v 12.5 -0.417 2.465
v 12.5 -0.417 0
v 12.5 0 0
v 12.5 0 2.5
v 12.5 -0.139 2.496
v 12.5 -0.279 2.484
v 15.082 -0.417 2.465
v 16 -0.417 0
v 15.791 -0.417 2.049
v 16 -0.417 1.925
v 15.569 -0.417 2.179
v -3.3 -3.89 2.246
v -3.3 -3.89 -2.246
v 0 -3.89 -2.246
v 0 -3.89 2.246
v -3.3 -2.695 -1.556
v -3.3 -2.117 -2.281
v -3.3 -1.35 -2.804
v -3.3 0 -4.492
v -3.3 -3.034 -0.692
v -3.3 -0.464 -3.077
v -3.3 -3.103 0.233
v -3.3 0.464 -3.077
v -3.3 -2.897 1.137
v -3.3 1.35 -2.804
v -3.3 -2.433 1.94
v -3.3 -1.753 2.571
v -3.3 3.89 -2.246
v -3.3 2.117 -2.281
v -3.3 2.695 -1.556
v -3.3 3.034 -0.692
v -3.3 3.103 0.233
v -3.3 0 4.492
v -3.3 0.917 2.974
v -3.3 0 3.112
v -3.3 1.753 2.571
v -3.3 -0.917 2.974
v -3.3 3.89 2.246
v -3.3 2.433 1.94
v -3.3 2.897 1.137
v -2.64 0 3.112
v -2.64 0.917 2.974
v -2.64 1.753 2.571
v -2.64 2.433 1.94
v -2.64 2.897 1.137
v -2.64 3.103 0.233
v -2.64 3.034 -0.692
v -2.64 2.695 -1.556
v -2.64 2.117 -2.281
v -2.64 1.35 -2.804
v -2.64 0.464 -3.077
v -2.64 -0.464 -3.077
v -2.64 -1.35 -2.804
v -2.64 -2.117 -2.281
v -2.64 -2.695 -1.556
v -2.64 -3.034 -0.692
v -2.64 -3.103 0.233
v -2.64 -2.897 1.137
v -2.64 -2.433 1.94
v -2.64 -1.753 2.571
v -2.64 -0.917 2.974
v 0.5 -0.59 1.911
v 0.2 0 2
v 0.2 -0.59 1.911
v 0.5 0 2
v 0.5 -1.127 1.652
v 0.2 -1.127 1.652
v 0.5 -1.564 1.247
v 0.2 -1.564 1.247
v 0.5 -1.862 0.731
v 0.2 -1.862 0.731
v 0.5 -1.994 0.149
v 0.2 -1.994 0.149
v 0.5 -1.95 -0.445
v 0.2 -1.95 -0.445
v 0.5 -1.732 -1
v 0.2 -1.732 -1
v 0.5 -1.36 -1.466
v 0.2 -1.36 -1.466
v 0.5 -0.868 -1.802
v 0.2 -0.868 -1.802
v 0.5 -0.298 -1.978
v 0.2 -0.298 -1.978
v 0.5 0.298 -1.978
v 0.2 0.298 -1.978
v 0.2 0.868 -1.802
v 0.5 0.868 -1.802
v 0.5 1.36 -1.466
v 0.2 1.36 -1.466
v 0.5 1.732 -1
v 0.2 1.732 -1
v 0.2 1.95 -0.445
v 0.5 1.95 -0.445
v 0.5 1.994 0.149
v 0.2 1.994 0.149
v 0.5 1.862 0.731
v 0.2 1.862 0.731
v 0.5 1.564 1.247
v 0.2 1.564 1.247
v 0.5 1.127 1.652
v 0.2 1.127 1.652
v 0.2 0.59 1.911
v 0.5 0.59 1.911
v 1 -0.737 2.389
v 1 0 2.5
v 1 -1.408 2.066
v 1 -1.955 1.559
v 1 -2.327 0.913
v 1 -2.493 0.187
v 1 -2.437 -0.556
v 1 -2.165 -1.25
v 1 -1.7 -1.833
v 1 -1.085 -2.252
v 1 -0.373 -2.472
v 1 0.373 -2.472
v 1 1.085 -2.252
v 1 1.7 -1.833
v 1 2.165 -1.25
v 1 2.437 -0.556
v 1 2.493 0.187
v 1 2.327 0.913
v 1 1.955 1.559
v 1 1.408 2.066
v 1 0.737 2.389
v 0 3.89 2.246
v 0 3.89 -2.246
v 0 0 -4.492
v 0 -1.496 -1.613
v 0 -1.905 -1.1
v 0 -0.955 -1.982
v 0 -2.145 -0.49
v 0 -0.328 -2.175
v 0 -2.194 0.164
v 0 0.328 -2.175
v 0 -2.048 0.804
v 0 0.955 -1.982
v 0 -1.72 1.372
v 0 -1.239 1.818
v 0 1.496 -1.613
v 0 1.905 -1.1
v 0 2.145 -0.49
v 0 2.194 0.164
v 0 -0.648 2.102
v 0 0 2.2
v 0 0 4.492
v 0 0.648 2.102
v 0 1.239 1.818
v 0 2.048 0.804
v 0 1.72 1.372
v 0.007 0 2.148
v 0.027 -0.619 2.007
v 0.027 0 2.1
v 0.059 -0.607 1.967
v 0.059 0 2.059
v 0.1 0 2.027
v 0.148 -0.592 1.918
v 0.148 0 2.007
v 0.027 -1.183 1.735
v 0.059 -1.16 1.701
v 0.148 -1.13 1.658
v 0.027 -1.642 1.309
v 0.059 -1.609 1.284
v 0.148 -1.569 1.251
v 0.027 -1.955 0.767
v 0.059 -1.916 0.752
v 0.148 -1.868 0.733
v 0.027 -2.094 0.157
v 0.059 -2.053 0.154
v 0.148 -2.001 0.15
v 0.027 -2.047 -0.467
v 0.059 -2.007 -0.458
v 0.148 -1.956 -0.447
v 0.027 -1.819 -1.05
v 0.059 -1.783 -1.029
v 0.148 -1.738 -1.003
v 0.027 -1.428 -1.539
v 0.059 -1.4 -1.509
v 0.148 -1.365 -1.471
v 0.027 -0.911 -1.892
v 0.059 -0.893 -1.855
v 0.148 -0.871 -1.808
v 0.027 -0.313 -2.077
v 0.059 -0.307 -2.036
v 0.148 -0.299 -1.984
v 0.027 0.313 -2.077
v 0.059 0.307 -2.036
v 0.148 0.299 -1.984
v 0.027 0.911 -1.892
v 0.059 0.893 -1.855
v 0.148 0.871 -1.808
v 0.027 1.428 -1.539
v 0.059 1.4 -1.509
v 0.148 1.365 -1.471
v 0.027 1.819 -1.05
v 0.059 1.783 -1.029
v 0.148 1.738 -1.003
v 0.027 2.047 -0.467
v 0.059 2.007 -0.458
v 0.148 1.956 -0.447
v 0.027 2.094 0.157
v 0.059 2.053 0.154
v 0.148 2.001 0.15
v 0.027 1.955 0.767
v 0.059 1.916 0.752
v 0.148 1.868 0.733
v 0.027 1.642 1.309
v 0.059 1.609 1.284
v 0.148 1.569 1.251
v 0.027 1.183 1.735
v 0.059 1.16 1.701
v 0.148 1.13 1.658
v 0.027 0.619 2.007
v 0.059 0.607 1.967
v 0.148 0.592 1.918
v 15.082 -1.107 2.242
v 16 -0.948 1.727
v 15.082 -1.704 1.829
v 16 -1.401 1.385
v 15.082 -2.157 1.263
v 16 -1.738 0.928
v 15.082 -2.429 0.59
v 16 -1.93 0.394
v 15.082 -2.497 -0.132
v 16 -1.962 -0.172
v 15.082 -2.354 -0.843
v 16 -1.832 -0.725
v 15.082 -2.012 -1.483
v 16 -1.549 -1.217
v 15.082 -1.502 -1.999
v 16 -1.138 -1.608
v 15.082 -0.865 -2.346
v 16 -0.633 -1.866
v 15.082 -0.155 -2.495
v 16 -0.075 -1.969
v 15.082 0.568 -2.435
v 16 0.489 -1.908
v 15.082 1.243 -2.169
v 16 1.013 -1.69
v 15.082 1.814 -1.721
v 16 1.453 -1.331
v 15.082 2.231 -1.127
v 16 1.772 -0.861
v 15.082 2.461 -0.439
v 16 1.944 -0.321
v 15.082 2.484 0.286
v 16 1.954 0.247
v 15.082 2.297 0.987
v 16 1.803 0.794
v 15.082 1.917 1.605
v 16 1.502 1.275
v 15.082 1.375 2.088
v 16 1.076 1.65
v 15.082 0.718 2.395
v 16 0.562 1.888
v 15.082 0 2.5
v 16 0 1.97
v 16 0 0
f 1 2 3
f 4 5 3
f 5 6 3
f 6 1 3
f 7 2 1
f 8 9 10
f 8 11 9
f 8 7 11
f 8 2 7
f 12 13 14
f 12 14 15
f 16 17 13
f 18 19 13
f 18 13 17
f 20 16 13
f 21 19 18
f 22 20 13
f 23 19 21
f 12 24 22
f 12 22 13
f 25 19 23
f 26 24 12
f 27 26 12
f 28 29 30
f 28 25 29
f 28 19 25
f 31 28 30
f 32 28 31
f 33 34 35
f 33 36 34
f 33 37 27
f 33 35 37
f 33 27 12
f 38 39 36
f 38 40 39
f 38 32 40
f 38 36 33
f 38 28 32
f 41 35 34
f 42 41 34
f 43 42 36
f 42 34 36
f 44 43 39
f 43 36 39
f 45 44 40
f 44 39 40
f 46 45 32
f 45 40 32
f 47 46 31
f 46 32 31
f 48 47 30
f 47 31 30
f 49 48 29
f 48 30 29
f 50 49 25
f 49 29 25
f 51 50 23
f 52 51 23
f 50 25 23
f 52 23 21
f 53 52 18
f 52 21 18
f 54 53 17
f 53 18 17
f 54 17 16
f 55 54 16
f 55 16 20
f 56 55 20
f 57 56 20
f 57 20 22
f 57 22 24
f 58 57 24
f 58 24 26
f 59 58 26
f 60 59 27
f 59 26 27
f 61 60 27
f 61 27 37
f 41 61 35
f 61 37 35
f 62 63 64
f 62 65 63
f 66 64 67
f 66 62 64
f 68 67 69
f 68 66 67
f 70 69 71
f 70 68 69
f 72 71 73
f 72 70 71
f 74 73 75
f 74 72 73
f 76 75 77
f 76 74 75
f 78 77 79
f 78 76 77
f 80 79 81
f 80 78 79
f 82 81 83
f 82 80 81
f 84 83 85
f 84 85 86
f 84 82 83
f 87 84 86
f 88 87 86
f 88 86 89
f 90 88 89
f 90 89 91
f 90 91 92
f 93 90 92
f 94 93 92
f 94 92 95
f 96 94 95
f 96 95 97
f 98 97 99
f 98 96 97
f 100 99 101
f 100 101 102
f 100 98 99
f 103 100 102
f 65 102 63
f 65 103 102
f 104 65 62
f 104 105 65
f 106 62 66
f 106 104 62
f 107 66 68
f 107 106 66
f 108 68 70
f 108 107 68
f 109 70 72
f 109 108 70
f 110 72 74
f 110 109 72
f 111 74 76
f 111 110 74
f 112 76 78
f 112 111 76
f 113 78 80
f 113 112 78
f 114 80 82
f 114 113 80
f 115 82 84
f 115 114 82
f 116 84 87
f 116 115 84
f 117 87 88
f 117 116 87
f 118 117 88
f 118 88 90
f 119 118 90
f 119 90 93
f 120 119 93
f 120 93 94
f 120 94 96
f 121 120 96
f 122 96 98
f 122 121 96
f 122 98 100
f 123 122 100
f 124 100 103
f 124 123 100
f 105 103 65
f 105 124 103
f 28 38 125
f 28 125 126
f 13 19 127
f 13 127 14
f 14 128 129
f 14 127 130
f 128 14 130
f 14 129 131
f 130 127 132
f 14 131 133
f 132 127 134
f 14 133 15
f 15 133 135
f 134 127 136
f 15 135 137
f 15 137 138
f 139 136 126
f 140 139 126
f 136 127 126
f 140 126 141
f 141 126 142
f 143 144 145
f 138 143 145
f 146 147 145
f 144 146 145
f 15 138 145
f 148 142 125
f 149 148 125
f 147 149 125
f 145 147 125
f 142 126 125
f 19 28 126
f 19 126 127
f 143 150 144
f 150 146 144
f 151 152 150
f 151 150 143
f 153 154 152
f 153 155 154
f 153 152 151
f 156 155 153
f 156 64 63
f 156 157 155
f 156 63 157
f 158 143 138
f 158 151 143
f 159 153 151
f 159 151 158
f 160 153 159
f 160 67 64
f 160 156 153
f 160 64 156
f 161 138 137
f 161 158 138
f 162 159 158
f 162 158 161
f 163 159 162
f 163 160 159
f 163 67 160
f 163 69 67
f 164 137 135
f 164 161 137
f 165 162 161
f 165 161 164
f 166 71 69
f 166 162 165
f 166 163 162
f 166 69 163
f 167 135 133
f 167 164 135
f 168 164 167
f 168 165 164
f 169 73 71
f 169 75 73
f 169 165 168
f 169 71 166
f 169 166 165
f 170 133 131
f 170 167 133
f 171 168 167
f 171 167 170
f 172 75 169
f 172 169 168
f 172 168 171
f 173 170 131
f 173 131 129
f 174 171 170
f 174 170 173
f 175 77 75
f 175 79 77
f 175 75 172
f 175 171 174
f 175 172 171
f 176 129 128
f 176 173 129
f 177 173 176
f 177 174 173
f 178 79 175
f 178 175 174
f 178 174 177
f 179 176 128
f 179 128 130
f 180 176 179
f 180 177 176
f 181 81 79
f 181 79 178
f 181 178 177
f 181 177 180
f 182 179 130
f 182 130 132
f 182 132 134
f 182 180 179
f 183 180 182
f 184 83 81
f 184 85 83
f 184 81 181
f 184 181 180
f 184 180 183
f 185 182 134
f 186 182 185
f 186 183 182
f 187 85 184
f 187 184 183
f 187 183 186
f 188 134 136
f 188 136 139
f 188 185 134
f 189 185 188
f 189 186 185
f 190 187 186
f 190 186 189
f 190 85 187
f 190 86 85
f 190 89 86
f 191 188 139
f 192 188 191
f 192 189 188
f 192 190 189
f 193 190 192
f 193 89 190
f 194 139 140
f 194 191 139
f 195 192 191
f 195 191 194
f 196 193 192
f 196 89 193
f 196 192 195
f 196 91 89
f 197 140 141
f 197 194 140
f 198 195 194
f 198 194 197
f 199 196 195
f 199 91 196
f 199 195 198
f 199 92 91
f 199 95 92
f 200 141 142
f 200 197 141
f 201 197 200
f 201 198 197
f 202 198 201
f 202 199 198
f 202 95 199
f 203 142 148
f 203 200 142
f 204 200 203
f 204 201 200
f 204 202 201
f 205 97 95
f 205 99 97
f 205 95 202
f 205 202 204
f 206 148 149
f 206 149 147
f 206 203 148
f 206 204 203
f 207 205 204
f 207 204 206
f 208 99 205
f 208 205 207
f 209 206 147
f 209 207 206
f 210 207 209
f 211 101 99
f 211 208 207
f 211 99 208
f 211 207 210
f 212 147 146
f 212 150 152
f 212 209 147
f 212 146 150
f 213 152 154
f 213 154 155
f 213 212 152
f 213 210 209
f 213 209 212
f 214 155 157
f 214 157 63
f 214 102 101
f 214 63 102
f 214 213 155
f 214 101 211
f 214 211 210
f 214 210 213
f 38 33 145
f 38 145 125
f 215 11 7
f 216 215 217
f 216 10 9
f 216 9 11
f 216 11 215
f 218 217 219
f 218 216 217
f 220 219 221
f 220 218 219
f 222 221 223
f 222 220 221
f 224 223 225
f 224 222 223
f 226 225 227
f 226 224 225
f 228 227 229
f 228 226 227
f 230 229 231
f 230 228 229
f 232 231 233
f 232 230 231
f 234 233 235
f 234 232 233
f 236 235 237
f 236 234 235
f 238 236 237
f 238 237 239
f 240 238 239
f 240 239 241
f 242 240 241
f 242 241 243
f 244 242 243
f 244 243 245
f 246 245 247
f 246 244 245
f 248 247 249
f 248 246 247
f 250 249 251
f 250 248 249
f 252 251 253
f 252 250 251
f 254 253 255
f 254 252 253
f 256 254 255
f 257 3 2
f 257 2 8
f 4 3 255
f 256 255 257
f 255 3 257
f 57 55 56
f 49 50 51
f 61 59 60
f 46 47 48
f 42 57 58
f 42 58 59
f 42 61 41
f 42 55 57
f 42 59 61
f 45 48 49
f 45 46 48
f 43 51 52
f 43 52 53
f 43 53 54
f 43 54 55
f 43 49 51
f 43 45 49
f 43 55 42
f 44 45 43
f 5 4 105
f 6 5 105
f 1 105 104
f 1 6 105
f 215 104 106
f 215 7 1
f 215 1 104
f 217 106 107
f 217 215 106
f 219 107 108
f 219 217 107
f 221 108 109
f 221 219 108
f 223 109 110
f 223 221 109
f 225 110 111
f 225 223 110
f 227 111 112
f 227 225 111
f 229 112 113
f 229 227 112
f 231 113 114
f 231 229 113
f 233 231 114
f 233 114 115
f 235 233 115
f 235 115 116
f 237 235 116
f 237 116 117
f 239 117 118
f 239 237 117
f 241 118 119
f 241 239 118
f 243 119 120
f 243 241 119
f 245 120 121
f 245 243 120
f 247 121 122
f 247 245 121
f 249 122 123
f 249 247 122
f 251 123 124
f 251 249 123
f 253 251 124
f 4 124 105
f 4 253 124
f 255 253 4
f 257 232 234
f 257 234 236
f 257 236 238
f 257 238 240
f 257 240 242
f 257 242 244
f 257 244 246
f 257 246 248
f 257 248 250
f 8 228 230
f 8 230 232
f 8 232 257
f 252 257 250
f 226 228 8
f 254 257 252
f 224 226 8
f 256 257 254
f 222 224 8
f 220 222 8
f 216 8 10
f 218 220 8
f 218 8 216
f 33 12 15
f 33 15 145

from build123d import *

# Parameters (mm, degrees)
EXTRUDE1_DEPTH           = 3.3
SKETCH11_W               = 3.5
SKETCH11_H               = 0.416666667
POINT_CUT_EXTRUDE8_DEPTH = 18.067754197
SKETCH16_R               = 3.112
CUT_EXTRUDE1_DEPTH       = 0.66


with BuildPart() as part:
    # Sketch1 → base-Revolve (revolve)
    with BuildSketch(Plane.XY, mode=Mode.PRIVATE) as base_revolve_sk:
        with BuildLine():
            Line((16, 2.5), (16, 0))
            Line((16, 0), (0, 0))
            Line((0, 0), (-2.64, 0))
            Line((-2.64, 0), (-3.3, 0))
            Line((-3.3, 0), (-3.3, 3.89))
            Line((-3.3, 3.89), (0, 3.89))
            Line((0, 3.89), (0, 2.2))
            ThreePointArc((0, 2.2), (0.058578644, 2.058578644), (0.2, 2))
            Line((0.2, 2), (0.5, 2))
            Line((0.5, 2), (1, 2.5))
            Line((1, 2.5), (16, 2.5))
        make_face()
    revolve(base_revolve_sk.sketch.rotate(Axis((0, 0, 0), (1, 0, 0)), 90), axis=Axis((0, 0, 0), (1, 0, 0)))

    # Sketch15 → Extrude1 (add)
    with BuildSketch(Plane.ZY.offset(3.3)):
        Polygon((-2.245892547, 3.89), (-4.491785094, 0), (-2.245892547, -3.89), (2.245892547, -3.89), (4.491785094, 0), (2.245892547, 3.89), align=None)
    extrude(amount=-EXTRUDE1_DEPTH)

    # Sketch8 → point_Cut-Revolve1 (revolve, cut)
    with BuildSketch(Plane.XY, mode=Mode.PRIVATE) as point_cut_revolve1_sk:
        Polygon((16, 0), (16.508, 0), (16.508, 3.008), (15.082013072, 3.008), (15.082013072, 2.5), (16, 1.97), align=None)
    revolve(point_cut_revolve1_sk.sketch.rotate(Axis((0, 0, 0), (1, 0, 0)), 90), axis=Axis((0, 0, 0), (1, 0, 0)), mode=Mode.SUBTRACT)

    # Sketch11 → point_Cut-Extrude8 (cut, through all)
    with BuildSketch(Plane.XY):
        with Locations((14.25, -0.208333334)):
            Rectangle(SKETCH11_W, SKETCH11_H)
    extrude(amount=POINT_CUT_EXTRUDE8_DEPTH, mode=Mode.SUBTRACT)

    # Sketch16 → Cut-Extrude1 (cut)
    with BuildSketch(Plane.ZY.offset(3.3)):
        Circle(SKETCH16_R)
    extrude(amount=-CUT_EXTRUDE1_DEPTH, mode=Mode.SUBTRACT)


solid = part.part
